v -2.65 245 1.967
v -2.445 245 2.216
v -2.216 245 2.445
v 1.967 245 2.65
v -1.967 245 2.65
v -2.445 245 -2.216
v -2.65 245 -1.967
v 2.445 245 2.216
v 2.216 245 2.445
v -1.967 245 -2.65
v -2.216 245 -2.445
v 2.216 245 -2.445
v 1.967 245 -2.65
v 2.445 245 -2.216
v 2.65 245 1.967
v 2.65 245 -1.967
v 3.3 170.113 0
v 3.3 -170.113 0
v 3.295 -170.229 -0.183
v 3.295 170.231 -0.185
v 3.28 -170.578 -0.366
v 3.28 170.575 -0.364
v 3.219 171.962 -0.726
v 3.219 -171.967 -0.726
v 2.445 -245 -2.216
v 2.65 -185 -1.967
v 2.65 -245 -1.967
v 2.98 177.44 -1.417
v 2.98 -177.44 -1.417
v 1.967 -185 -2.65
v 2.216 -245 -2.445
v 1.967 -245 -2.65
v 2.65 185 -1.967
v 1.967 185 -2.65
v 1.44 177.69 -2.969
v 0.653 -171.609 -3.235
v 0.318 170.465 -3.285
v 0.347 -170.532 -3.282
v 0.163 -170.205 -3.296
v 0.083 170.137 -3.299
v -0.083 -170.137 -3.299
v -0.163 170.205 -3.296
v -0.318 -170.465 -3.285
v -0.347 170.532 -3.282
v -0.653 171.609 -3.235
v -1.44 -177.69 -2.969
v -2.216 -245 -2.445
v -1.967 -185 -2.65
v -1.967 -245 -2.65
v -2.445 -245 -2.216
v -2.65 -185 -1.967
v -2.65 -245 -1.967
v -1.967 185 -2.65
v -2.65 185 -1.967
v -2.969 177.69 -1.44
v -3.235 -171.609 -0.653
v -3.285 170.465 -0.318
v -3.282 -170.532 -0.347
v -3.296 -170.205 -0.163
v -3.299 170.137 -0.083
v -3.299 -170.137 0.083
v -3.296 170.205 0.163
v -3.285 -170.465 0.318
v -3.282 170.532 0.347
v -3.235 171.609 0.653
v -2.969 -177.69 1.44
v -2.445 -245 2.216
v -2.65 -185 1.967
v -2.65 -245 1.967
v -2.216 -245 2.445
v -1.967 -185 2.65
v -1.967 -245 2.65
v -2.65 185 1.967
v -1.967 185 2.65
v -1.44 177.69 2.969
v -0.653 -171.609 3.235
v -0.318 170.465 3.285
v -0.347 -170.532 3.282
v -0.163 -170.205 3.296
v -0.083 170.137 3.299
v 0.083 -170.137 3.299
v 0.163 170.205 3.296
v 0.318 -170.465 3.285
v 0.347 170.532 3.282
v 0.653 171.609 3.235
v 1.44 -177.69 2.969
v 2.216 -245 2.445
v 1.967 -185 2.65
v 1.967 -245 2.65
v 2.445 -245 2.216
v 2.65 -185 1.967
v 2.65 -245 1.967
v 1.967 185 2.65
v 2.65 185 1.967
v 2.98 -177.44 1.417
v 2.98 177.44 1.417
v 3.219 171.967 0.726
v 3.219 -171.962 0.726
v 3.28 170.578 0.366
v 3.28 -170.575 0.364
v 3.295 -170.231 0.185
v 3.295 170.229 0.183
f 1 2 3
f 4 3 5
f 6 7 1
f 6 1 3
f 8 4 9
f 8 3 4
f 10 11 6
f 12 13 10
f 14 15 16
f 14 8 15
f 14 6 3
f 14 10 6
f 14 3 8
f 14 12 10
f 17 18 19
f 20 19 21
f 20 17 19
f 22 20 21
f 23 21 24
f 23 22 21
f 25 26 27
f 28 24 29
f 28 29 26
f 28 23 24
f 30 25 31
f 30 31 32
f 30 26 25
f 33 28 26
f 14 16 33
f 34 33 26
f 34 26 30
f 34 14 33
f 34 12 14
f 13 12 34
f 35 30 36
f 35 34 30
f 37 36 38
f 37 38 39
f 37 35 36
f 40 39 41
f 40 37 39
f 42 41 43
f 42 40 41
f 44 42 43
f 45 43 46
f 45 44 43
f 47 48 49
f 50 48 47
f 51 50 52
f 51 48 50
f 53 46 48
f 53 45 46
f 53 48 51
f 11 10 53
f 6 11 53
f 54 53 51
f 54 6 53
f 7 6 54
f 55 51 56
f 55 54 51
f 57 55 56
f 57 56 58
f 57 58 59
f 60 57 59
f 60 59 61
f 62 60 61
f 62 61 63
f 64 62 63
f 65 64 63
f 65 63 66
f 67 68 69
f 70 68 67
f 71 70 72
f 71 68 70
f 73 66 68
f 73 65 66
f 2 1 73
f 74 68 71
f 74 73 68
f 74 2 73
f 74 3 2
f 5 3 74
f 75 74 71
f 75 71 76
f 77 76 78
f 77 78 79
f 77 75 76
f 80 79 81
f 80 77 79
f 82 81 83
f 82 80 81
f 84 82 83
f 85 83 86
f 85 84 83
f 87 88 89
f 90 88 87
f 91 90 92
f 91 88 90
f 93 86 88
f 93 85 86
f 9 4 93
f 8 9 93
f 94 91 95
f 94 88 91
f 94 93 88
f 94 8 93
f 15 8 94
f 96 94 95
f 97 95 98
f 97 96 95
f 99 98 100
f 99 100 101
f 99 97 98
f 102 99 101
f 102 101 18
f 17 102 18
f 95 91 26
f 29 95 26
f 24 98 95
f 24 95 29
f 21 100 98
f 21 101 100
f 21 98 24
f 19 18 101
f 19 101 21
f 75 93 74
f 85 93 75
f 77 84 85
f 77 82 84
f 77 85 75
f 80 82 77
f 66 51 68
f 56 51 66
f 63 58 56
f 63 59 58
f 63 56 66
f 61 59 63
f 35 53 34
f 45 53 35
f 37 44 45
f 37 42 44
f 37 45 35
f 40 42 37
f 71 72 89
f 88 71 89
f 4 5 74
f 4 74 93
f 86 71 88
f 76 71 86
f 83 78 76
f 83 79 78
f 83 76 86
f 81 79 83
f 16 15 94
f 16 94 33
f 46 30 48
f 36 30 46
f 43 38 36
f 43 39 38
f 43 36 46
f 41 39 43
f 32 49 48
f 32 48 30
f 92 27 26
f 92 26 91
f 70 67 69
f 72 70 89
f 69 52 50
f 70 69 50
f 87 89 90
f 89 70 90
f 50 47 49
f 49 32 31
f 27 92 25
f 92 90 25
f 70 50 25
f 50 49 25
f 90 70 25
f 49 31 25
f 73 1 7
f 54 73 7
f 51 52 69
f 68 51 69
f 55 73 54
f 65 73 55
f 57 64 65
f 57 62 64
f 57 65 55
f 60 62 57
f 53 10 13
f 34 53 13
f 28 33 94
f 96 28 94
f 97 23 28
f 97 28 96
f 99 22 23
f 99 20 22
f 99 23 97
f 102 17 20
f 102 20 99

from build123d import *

# Parameters (mm, degrees)
BOSS_EXTRUDE1_DEPTH      = 245
BOSS_EXTRUDE1_DEPTH_BACK = 245
SKETCH1_R                = 3.3
SKETCH2_OUTSIDE_W        = 106.618
SKETCH2_OUTSIDE_H        = 106.618
SKETCH2_OUTSIDE_W_2      = 5.3
SKETCH2_OUTSIDE_H_2      = 5.3
CUT_EXTRUDE1_DEPTH       = 60
SKETCH3_OUTSIDE_W        = 107.928
SKETCH3_OUTSIDE_H        = 107.928
CUT_EXTRUDE2_DEPTH       = 15
CUT_EXTRUDE2_DRAFT       = -2.5
SKETCH4_OUTSIDE_W        = 106.618
SKETCH4_OUTSIDE_H        = 106.618
SKETCH4_OUTSIDE_W_2      = 5.3
SKETCH4_OUTSIDE_H_2      = 5.3
CUT_EXTRUDE3_DEPTH       = 60
SKETCH5_OUTSIDE_W        = 107.928
SKETCH5_OUTSIDE_H        = 107.928
CUT_EXTRUDE4_DEPTH       = 15
CUT_EXTRUDE4_DRAFT       = -2.5


with BuildPart() as part:
    # Sketch1 → Boss-Extrude1 (new, two sides: drawn at the far end of the back side and taken through both)
    with BuildSketch(Plane(origin=(0, 0, 0), x_dir=(1, 0, 0), z_dir=(0, 1, 0)).offset(-BOSS_EXTRUDE1_DEPTH_BACK)):
        Circle(SKETCH1_R)
    extrude(amount=BOSS_EXTRUDE1_DEPTH + BOSS_EXTRUDE1_DEPTH_BACK)

    # Sketch2 outside → Cut-Extrude1 (cut)
    with BuildSketch(Plane(origin=(0, 245, 0), x_dir=(1, 0, 0), z_dir=(0, 1, 0))):
        Rectangle(SKETCH2_OUTSIDE_W, SKETCH2_OUTSIDE_H)
        Rectangle(SKETCH2_OUTSIDE_W_2, SKETCH2_OUTSIDE_H_2, mode=Mode.SUBTRACT)
    extrude(amount=-CUT_EXTRUDE1_DEPTH, mode=Mode.SUBTRACT)


with BuildPart() as cut_extrude2_tool:
    # Sketch3 outside → Cut-Extrude2 (with draft: the straight prism first)
    with BuildSketch(Plane(origin=(0, 185, 0), x_dir=(1, 0, 0), z_dir=(0, 1, 0))):
        Rectangle(SKETCH3_OUTSIDE_W, SKETCH3_OUTSIDE_H)
        Polygon((-1.966596044, -2.65), (1.966596044, -2.65), (2.65, -2.65), (2.65, -1.966596044), (2.65, 1.966596044), (2.65, 2.65), (1.966596044, 2.65), (-1.966596044, 2.65), (-2.65, 2.65), (-2.65, 1.966596044), (-2.65, -1.966596044), (-2.65, -2.65), align=None, mode=Mode.SUBTRACT)
    extrude(amount=-CUT_EXTRUDE2_DEPTH)
    # Cut-Extrude2: the draft: its side faces are tilted about the plane it starts from
    cut_extrude2_sides = [cut_extrude2_tool.faces().sort_by_distance(p)[0] for p in [
        (0, 177.5, 53.964),
        (0, 177.5, 2.65),
        (2.65, 177.5, 0),
        (0, 177.5, -2.65),
        (-2.65, 177.5, 0),
        (0, 177.5, -53.964),
        (53.964, 177.5, 0),
        (-53.964, 177.5, 0),
    ]]
    draft(cut_extrude2_sides, Plane(origin=(0, 185, 0), x_dir=(1, 0, 0), z_dir=(0, 1, 0)), CUT_EXTRUDE2_DRAFT)


with BuildPart() as part_1:
    add(part.part)

    # Cut-Extrude2: cut by cut_extrude2_tool
    add(cut_extrude2_tool.part, mode=Mode.SUBTRACT)

    # Sketch4 outside → Cut-Extrude3 (cut)
    with BuildSketch(Plane.XZ.offset(245)):
        Rectangle(SKETCH4_OUTSIDE_W, SKETCH4_OUTSIDE_H)
        Rectangle(SKETCH4_OUTSIDE_W_2, SKETCH4_OUTSIDE_H_2, mode=Mode.SUBTRACT)
    extrude(amount=-CUT_EXTRUDE3_DEPTH, mode=Mode.SUBTRACT)


with BuildPart() as cut_extrude4_tool:
    # Sketch5 outside → Cut-Extrude4 (with draft: the straight prism first)
    with BuildSketch(Plane.XZ.offset(185)):
        Rectangle(SKETCH5_OUTSIDE_W, SKETCH5_OUTSIDE_H)
        Polygon((1.966596044, -2.65), (2.65, -2.65), (2.65, -1.966596044), (2.65, 1.966596044), (2.65, 2.65), (1.966596044, 2.65), (-1.966596044, 2.65), (-2.65, 2.65), (-2.65, 1.966596044), (-2.65, -1.966596044), (-2.65, -2.65), (-1.966596044, -2.65), align=None, mode=Mode.SUBTRACT)
    extrude(amount=-CUT_EXTRUDE4_DEPTH)
    # Cut-Extrude4: the draft: its side faces are tilted about the plane it starts from
    cut_extrude4_sides = [cut_extrude4_tool.faces().sort_by_distance(p)[0] for p in [
        (0, -177.5, -53.964),
        (0, -177.5, -2.65),
        (2.65, -177.5, 0),
        (0, -177.5, 2.65),
        (-2.65, -177.5, 0),
        (0, -177.5, 53.964),
        (53.964, -177.5, 0),
        (-53.964, -177.5, 0),
    ]]
    draft(cut_extrude4_sides, Plane.XZ.offset(185), CUT_EXTRUDE4_DRAFT)


with BuildPart() as part_2:
    add(part_1.part)

    # Cut-Extrude4: cut by cut_extrude4_tool
    add(cut_extrude4_tool.part, mode=Mode.SUBTRACT)


solid = part_2.part
